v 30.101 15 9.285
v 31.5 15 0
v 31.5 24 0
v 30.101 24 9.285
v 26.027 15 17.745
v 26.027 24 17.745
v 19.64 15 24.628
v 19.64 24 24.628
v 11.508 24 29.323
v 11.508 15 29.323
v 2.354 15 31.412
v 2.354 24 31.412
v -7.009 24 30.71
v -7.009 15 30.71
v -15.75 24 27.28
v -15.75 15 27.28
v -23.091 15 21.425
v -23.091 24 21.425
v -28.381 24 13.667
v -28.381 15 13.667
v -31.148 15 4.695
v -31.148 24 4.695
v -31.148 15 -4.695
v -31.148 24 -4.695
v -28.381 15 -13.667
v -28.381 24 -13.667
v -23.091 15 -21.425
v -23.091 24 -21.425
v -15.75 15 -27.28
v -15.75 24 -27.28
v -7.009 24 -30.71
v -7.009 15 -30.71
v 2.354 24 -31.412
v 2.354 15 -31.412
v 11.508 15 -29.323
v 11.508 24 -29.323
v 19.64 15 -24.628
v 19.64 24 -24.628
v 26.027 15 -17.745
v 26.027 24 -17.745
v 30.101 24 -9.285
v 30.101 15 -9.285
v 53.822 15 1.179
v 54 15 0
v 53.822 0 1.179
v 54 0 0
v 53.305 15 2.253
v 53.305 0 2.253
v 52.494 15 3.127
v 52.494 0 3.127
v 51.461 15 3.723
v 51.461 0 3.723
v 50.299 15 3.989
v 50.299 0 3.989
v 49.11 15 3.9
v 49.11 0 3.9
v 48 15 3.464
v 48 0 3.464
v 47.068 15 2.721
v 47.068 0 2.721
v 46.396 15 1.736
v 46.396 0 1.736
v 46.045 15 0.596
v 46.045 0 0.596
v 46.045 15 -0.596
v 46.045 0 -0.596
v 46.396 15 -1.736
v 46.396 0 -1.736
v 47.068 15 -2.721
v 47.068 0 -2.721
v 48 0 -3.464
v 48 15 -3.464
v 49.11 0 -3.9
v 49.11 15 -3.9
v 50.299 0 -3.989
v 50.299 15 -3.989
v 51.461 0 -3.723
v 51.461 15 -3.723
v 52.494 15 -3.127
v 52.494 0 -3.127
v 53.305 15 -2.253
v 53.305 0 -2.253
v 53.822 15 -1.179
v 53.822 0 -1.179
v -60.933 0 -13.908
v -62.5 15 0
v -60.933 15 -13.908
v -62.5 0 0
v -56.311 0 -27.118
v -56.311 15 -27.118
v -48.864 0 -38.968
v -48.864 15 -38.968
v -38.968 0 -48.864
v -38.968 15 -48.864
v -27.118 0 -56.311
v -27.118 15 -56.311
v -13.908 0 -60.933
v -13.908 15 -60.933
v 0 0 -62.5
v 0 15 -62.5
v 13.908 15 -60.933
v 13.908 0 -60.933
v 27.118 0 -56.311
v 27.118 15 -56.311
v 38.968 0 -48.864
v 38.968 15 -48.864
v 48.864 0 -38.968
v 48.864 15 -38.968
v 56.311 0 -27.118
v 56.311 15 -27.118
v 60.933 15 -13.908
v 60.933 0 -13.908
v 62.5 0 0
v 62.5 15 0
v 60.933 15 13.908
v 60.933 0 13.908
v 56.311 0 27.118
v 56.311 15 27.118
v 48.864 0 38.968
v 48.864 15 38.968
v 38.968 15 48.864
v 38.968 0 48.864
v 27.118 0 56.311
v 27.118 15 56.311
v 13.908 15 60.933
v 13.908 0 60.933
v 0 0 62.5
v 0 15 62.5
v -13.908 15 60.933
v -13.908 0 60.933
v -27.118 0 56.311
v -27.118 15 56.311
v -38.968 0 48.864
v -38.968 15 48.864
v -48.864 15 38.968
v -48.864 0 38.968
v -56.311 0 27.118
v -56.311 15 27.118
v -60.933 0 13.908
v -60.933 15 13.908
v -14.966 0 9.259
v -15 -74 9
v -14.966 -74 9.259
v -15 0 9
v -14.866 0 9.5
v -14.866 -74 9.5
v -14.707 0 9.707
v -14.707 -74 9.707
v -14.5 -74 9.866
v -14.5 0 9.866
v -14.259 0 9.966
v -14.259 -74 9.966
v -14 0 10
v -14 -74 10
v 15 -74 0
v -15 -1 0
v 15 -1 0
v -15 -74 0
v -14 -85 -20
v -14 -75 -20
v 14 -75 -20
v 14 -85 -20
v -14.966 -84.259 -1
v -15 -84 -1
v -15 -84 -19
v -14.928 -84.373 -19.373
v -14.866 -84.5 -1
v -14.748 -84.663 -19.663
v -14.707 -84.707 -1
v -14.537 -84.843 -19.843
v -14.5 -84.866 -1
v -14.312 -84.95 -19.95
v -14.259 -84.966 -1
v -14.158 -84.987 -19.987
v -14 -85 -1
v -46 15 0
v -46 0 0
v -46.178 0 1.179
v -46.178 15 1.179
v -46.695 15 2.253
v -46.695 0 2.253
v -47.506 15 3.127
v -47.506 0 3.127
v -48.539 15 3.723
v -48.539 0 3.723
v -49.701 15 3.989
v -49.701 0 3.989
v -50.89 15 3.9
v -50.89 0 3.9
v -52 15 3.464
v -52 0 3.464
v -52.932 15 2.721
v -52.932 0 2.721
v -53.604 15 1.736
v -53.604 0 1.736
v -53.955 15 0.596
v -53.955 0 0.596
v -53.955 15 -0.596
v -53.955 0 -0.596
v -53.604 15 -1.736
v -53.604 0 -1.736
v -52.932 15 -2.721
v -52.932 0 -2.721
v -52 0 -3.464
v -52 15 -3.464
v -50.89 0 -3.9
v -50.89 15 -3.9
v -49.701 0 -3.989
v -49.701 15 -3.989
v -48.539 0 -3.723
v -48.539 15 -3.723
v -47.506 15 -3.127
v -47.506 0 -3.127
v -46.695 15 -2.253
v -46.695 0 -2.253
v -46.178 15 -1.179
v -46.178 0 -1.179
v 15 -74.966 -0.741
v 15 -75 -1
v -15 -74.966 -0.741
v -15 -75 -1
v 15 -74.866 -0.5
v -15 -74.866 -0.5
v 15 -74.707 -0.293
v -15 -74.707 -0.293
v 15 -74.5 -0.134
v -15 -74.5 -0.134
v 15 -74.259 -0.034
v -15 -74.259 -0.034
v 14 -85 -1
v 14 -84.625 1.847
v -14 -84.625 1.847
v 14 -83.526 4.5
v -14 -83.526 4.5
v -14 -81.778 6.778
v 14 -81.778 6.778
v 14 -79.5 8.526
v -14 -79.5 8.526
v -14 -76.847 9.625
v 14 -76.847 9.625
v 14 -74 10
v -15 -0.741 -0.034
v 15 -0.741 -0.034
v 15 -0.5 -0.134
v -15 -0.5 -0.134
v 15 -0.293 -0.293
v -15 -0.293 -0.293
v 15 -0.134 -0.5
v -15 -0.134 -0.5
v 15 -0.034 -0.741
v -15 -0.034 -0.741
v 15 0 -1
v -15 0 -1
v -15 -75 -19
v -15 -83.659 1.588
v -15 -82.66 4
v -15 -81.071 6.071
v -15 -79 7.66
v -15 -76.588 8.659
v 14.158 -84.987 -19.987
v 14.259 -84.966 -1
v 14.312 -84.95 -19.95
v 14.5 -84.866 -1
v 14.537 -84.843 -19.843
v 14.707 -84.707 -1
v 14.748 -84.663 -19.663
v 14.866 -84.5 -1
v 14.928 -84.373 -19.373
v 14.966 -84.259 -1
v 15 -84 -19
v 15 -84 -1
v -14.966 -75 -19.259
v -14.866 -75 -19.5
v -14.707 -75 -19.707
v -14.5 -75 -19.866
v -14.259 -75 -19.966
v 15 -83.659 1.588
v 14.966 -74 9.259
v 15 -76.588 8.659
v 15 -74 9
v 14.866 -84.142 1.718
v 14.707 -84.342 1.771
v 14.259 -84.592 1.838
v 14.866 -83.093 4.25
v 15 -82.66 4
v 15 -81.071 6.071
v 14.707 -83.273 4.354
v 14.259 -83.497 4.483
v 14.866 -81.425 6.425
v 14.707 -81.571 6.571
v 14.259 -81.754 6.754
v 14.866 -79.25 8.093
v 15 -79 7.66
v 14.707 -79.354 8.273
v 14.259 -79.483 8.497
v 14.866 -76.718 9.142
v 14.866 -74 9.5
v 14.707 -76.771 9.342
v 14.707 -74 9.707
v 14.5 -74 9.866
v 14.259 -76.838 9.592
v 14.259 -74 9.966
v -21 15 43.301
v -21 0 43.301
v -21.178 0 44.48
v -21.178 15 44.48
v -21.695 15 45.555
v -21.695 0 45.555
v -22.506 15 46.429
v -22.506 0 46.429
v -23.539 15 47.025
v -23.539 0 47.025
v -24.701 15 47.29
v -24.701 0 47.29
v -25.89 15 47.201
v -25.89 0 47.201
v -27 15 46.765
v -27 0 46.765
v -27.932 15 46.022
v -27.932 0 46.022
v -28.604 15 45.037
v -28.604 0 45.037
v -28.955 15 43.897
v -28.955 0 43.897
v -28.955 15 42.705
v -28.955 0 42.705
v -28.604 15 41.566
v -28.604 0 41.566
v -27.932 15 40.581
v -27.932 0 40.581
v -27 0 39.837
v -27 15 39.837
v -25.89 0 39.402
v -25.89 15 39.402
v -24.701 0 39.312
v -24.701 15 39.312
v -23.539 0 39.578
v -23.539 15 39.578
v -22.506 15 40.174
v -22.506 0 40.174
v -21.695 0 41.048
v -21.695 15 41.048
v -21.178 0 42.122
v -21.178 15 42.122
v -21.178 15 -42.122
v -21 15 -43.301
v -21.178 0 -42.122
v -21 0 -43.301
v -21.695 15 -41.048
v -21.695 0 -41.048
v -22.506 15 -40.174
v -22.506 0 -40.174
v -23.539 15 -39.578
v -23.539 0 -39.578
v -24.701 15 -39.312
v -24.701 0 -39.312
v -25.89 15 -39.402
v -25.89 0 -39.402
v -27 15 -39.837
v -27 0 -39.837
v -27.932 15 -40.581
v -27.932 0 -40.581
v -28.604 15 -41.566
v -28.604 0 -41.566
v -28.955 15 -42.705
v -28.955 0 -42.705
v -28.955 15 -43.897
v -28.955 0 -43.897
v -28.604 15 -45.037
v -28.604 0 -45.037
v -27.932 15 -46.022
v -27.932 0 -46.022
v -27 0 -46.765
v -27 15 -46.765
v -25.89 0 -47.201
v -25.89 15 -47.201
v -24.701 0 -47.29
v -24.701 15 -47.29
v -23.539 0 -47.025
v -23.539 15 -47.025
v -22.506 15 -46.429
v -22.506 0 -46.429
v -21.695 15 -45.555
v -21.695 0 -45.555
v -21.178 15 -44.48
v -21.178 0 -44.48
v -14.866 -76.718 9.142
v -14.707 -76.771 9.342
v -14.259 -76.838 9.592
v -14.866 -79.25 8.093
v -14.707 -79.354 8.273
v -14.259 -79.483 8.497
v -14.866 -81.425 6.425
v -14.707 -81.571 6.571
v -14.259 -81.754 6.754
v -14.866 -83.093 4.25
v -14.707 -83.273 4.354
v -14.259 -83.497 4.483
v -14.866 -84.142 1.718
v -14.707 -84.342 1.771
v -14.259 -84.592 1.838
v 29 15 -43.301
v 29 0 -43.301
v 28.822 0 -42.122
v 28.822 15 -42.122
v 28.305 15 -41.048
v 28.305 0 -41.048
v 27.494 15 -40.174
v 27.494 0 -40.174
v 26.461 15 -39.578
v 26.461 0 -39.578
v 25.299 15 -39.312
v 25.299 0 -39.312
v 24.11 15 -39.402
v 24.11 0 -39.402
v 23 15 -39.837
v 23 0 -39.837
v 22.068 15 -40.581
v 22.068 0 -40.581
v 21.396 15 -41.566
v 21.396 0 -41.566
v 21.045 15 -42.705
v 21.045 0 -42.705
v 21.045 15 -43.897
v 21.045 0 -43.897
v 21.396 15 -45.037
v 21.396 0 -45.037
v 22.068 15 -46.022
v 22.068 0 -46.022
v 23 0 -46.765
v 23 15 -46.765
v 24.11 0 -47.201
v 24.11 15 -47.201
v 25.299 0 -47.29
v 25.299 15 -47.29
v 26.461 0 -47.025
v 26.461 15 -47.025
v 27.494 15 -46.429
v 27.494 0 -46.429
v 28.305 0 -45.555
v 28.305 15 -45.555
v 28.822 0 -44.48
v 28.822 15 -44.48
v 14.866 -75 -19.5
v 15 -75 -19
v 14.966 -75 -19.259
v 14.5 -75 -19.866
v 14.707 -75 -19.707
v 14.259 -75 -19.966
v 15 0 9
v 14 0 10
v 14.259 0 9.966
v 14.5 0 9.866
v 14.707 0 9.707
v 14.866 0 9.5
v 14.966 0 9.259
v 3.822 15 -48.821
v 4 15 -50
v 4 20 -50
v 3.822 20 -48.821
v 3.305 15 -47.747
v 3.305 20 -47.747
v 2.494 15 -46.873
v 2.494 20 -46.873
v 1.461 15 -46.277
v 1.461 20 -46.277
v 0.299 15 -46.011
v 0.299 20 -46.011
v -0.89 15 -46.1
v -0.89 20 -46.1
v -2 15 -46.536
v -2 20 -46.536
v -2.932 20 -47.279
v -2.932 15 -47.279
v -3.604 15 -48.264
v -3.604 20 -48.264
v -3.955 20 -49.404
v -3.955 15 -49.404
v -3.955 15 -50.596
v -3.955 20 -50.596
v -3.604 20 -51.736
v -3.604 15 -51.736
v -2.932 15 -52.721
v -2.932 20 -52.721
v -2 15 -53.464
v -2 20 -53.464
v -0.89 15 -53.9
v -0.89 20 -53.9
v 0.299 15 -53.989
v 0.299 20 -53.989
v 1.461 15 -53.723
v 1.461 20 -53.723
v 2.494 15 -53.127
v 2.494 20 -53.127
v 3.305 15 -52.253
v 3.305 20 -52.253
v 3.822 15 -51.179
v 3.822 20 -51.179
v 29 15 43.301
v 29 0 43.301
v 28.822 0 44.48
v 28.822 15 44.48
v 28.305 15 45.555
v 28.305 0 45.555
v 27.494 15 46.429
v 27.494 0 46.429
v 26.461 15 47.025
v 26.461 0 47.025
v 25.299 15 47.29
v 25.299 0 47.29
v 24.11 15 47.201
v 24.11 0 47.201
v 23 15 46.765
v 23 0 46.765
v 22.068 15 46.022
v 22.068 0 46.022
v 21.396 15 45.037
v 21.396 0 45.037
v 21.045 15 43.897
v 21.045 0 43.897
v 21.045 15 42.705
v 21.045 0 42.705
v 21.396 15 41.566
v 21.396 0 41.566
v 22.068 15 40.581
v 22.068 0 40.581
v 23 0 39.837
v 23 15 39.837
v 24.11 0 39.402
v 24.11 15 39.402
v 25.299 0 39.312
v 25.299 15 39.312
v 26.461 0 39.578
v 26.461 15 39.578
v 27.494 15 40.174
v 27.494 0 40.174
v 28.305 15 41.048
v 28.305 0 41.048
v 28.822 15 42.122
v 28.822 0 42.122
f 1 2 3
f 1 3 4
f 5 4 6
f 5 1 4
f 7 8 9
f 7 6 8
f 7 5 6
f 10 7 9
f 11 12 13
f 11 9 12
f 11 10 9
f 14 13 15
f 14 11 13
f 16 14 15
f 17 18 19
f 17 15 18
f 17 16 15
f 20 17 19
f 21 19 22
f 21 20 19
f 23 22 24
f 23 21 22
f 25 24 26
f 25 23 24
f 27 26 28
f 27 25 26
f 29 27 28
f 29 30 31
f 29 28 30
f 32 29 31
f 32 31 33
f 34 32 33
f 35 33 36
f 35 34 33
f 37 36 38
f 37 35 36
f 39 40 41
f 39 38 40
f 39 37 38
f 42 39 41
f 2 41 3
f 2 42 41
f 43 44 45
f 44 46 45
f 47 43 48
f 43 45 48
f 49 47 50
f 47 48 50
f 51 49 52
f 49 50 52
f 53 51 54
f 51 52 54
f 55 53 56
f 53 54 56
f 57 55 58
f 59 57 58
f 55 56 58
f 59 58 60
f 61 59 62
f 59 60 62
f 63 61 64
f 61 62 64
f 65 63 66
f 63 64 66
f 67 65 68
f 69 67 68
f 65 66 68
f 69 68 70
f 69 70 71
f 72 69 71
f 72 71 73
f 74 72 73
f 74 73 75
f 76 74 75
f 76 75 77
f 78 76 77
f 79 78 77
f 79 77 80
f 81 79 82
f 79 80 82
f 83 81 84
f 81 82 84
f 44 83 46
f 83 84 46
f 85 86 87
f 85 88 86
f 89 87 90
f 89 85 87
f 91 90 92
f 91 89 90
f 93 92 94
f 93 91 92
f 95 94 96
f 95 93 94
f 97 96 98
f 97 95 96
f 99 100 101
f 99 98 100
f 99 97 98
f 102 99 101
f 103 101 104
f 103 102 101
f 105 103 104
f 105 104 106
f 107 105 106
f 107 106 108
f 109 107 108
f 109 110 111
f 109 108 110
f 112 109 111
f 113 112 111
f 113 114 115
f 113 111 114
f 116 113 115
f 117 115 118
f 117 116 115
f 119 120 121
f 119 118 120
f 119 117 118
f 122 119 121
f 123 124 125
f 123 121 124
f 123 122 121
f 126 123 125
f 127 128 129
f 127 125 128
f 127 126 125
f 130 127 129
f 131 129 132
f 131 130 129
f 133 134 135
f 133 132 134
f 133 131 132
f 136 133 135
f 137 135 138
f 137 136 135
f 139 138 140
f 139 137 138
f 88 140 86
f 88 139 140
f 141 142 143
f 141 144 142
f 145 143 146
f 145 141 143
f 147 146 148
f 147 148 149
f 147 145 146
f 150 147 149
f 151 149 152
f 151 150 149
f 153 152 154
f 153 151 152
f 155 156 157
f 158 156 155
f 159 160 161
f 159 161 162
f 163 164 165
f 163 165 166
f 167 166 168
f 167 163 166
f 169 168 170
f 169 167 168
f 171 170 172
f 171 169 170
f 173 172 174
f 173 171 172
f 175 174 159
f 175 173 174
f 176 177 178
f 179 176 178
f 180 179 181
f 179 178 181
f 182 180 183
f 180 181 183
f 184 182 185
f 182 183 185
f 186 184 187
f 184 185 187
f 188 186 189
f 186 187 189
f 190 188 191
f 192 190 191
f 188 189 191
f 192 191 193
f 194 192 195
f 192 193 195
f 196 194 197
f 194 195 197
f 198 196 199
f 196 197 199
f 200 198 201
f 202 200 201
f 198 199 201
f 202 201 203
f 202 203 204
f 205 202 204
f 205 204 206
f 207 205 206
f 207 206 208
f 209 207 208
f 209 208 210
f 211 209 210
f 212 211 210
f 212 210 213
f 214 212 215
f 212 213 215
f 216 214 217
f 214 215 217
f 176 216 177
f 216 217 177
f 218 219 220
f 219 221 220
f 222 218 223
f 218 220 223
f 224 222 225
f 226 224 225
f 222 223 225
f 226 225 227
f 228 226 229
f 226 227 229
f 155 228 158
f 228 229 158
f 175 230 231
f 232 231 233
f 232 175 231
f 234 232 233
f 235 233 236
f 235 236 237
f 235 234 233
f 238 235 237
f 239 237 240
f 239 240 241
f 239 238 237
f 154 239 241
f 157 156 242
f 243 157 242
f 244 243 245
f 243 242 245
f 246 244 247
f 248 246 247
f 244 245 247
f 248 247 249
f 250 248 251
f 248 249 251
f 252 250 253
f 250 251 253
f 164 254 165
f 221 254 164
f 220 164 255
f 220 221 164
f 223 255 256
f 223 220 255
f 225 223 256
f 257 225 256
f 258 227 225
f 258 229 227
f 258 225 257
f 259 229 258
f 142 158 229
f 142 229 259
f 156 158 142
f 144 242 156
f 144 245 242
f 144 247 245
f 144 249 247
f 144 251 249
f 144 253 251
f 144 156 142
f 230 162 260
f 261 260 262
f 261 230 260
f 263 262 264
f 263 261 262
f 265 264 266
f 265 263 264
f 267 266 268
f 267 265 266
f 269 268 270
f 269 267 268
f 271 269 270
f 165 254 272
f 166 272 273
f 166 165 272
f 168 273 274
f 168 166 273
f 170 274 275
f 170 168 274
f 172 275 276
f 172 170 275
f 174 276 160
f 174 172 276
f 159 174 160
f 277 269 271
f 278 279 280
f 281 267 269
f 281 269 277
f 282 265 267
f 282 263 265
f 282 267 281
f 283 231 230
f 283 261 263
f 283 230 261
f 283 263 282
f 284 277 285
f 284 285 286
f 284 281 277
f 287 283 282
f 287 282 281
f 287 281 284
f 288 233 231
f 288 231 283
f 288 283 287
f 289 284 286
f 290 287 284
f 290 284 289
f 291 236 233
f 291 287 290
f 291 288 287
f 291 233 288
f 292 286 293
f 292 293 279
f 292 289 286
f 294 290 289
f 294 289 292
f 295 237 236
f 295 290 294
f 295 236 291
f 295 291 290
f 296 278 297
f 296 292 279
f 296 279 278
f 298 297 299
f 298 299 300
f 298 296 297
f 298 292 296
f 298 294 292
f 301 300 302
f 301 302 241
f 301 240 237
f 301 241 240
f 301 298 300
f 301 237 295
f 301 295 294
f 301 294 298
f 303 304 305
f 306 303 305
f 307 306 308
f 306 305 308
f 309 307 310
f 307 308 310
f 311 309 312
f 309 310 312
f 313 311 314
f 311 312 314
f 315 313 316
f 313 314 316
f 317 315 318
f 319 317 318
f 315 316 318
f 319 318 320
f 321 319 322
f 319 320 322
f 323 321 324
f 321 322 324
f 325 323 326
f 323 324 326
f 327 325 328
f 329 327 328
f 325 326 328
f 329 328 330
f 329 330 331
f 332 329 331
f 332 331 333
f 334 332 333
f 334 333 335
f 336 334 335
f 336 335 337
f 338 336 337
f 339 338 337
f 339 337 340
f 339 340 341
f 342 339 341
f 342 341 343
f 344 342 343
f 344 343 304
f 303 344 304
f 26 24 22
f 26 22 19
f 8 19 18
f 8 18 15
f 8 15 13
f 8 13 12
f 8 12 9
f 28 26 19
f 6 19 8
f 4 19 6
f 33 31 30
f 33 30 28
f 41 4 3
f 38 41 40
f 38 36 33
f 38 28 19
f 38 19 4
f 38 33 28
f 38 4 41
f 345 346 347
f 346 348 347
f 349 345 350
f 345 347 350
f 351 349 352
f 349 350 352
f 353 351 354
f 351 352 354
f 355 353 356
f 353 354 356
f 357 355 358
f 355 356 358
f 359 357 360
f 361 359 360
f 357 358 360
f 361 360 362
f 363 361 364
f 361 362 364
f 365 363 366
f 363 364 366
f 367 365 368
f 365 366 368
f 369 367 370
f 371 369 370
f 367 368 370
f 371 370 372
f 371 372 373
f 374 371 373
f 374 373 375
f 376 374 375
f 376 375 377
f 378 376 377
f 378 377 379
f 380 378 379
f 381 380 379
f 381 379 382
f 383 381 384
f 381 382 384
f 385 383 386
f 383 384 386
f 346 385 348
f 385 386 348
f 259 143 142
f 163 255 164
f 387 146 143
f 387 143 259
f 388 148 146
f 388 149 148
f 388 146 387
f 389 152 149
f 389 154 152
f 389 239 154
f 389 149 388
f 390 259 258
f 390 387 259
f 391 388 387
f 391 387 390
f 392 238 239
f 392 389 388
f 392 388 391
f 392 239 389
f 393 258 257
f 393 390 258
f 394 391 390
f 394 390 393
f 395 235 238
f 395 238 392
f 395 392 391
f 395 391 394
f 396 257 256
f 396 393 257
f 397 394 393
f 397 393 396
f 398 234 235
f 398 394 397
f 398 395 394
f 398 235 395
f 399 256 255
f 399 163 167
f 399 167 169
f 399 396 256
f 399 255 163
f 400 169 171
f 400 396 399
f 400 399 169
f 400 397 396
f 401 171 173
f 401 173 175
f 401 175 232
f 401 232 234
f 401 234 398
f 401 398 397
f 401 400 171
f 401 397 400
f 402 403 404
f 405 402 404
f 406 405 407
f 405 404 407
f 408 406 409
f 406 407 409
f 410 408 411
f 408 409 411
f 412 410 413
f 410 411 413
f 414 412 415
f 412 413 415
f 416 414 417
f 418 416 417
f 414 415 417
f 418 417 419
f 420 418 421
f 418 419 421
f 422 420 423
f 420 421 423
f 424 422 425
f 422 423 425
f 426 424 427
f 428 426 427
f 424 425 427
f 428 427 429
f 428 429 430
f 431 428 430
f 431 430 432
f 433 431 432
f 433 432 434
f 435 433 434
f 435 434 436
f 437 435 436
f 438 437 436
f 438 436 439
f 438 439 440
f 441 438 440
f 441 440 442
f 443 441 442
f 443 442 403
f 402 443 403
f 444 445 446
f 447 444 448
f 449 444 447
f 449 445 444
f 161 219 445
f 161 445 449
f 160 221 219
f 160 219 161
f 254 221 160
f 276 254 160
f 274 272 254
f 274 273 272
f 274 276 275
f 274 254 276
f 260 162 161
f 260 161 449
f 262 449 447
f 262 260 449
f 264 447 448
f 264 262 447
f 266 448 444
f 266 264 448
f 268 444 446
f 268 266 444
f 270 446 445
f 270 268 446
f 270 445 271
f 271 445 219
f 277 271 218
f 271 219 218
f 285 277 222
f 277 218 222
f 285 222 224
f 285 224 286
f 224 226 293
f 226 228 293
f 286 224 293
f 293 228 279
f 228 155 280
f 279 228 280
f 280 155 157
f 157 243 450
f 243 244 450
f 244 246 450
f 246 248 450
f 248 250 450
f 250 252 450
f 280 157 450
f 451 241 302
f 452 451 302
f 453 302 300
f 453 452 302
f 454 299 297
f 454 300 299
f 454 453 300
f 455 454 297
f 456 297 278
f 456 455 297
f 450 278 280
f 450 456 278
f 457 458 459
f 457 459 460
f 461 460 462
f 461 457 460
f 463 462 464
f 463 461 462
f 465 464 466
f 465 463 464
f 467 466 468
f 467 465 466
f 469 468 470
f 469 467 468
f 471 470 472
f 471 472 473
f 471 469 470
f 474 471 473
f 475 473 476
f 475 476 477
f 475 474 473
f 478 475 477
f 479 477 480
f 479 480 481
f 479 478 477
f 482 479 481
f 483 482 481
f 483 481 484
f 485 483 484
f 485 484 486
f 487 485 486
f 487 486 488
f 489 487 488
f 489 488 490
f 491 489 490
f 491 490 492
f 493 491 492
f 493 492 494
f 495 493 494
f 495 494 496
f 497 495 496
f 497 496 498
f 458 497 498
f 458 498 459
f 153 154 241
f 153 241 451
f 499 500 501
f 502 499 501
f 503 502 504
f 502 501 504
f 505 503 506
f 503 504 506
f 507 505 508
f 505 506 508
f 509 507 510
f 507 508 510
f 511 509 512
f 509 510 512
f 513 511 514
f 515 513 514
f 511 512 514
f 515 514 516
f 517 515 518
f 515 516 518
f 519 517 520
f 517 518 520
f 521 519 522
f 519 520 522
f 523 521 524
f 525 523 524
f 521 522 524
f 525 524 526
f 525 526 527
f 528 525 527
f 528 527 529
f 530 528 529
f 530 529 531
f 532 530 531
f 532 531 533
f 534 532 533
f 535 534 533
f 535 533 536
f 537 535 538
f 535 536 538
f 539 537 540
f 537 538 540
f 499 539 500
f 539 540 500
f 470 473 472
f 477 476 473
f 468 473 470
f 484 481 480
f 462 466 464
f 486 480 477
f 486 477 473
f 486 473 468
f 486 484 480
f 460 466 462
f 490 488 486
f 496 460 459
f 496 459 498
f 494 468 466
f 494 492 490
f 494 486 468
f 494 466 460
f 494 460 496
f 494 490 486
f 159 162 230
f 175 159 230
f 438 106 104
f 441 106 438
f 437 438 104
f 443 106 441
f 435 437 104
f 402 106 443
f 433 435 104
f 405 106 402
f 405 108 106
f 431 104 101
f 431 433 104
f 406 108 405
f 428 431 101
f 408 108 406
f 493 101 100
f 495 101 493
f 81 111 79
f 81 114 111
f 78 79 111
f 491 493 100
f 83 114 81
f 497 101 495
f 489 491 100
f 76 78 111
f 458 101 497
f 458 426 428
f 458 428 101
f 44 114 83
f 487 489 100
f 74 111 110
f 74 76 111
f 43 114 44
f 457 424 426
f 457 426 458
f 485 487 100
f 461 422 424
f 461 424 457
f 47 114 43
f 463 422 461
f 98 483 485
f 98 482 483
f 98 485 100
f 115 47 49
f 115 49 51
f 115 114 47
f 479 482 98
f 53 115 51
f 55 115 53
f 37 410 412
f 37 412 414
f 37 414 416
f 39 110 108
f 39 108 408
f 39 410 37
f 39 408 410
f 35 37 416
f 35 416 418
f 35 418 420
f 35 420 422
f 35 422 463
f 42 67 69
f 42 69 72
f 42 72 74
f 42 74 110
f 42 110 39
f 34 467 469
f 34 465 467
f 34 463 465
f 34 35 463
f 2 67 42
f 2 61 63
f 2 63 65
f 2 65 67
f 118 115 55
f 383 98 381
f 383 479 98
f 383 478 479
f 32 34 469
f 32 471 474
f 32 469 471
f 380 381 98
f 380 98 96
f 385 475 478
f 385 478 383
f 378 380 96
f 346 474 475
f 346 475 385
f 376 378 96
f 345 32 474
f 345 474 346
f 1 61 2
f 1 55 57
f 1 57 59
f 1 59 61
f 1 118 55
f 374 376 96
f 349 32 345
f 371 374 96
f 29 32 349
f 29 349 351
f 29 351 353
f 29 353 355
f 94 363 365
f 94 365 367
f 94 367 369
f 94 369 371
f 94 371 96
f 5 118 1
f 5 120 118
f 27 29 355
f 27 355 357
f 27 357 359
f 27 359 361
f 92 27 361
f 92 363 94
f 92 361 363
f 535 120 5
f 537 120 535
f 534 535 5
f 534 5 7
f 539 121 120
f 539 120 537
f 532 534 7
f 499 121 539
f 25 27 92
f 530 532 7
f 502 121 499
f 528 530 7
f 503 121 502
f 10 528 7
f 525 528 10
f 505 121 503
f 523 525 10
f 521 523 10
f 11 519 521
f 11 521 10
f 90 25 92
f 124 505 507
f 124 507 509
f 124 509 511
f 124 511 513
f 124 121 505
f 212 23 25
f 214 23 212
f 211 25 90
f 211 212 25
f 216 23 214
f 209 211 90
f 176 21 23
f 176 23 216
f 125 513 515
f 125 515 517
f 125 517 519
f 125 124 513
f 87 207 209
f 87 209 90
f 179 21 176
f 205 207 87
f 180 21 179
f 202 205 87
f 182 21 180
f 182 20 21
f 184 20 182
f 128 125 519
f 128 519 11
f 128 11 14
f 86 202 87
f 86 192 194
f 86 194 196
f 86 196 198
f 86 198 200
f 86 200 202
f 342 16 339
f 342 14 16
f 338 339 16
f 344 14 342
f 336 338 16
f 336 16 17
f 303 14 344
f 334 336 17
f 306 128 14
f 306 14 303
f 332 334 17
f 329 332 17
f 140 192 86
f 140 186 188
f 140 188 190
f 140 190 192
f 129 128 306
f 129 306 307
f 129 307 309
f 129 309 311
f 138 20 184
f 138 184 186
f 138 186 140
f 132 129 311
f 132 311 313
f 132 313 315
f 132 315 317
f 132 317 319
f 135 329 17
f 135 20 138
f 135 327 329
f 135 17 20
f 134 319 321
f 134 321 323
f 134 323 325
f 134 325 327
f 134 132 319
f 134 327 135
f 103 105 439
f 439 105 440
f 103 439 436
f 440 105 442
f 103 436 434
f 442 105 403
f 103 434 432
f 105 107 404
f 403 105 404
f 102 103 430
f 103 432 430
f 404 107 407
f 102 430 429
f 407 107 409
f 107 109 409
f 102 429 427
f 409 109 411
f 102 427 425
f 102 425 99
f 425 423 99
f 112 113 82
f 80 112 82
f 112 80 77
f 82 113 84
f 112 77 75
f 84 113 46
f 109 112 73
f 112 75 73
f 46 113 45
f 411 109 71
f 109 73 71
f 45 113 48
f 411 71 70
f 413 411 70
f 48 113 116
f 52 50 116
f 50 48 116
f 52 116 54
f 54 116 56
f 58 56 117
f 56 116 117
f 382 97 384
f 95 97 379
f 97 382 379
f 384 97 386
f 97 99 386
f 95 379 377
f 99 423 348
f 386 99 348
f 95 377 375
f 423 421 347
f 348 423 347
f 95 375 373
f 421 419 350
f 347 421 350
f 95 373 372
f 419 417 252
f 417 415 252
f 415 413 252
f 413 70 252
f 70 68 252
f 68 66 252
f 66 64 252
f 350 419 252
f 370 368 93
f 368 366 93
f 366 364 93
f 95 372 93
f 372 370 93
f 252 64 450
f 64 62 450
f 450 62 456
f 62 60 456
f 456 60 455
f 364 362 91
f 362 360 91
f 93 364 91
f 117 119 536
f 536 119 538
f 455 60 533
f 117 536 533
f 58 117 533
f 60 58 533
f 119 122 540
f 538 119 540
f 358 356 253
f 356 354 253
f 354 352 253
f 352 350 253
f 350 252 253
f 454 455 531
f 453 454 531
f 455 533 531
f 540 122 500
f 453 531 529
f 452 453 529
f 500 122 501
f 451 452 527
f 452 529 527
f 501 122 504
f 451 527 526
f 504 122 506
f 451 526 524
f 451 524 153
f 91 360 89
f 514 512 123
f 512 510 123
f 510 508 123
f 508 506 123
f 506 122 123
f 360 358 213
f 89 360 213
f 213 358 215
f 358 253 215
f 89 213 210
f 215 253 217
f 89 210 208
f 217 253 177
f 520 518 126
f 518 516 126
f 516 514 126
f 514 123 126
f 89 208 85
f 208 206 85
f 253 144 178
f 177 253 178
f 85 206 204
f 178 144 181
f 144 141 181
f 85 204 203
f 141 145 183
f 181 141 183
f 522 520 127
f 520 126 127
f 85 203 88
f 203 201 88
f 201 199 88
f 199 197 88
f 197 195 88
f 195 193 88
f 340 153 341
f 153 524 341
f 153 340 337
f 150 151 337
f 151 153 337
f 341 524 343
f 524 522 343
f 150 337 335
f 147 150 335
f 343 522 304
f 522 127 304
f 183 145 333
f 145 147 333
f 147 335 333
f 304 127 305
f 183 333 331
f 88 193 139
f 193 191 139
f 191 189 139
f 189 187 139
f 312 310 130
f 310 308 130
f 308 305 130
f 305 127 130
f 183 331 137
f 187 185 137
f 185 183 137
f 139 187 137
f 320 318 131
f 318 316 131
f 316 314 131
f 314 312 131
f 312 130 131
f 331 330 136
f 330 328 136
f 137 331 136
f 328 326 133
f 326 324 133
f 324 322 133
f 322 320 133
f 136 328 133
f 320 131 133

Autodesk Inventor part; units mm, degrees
ref_plane "YZ Plane" through (0, 0, 0) normal (1, 0, 0) x (0, 1, 0)
ref_plane "XZ Plane" through (0, 0, 0) normal (0, 1, 0) x (-1, 0, 0)
ref_plane "XY Plane" through (0, 0, 0) normal (0, 0, 1) x (1, 0, 0)
sketch "Sketch3" plane through (0, 0, 0) normal (0, 1, 0) x (-1, 0, 0)
  circle A0 centre (0, 0) radius 62.5
  dimension "d10" = 125
extrude "Extrusion3" add sketch "Sketch3" along normal blind 15
sketch "Sketch9" plane through (0, 0, 0) normal (0, -1, 0) x (1, 0, 0)
  circle A0 centre (0, 0) radius 50
  circle A1 centre (-50, 0) radius 4
  circle A2 centre (-25, -43.3013) radius 4
  circle A3 centre (25, -43.3013) radius 4
  circle A4 centre (50, 0) radius 4
  circle A5 centre (25, 43.3013) radius 4
  circle A6 centre (-25, 43.3013) radius 4
  dimension "d45" = 100
  dimension "d46" = 8
  dimension "d49" = 360
extrude "Extrusion8" cut sketch "Sketch9" against normal blind 20 contours A0 A4 | A0 A4 | A5 A0 | A0 A5 | A3 A0 | A0 A3 | A6 A0 | A0 A6 | A2 A0 | A0 A2 | A1 A0 | A0 A1
sketch "Sketch10" plane through (0, 15, 0) normal (0, 1, 0) x (1, 0, 0)
  circle A0 centre (25, 43.3013) radius 4 projected
  circle A1 centre (0, 0) radius 50
  circle A2 centre (0, 50) radius 4
  circle A3 centre (0, 0) radius 31.5
  dimension "d53" = 8
  dimension "d54" = 63
extrude "Extrusion9" add sketch "Sketch10" along normal blind 9 contours A3
extrude "Extrusion10" add sketch "Sketch10" along normal blind 5 contours A2 A1 | A1 A2
ref_plane "Work Plane1" through (-20, 0, -20) normal (-1, 0, 0) x (0, 0, 1)
sketch "Sketch14" plane through (-20, 0, -20) normal (-1, 0, 0) x (0, 0, 1)
  line L0 (20, -1) -> (20, -74)
  arc A0 (20, -1) -> (19, 0) centre (19, -1) ccw
  line L1 (19, -75) -> (0, -75)
  arc A1 (19, -75) -> (20, -74) centre (19, -74) ccw
  line L2 (0, -85) -> (19, -85)
  arc A2 (19, -85) -> (30, -74) centre (19, -74) ccw
  line L3 (30, -74) -> (30, -5)
  line L4 (30, -5) -> (30, 0)
  line L5 (30, 0) -> (19, 0)
  line L6 (0, -75) -> (0, -85)
  point P0 (20, 0)
  point P1 (20, -75)
  dimension "d92" = 75
  dimension "d93" = 1
  dimension "d94" = 20
  dimension "d95" = 1
  dimension "d96" = 10
  dimension "d102" = 75
extrude "Extrusion16" add sketch "Sketch14" against normal blind 35
extrude "Extrusion17" cut sketch "Sketch14" against normal blind 5
fillet "Fillet4" radius 1 8 edges at (15, -80, -20) (-15, -80, -20) (-15, -81.7782, 6.7782) (-15, -85, -10.5) (-15, -37, 10) (15, -81.7782, 6.7782) (15, -37, 10) (15, -85, -10.5)
properties part number "EndEffector" material "Steel, High Strength, Low Alloy"
